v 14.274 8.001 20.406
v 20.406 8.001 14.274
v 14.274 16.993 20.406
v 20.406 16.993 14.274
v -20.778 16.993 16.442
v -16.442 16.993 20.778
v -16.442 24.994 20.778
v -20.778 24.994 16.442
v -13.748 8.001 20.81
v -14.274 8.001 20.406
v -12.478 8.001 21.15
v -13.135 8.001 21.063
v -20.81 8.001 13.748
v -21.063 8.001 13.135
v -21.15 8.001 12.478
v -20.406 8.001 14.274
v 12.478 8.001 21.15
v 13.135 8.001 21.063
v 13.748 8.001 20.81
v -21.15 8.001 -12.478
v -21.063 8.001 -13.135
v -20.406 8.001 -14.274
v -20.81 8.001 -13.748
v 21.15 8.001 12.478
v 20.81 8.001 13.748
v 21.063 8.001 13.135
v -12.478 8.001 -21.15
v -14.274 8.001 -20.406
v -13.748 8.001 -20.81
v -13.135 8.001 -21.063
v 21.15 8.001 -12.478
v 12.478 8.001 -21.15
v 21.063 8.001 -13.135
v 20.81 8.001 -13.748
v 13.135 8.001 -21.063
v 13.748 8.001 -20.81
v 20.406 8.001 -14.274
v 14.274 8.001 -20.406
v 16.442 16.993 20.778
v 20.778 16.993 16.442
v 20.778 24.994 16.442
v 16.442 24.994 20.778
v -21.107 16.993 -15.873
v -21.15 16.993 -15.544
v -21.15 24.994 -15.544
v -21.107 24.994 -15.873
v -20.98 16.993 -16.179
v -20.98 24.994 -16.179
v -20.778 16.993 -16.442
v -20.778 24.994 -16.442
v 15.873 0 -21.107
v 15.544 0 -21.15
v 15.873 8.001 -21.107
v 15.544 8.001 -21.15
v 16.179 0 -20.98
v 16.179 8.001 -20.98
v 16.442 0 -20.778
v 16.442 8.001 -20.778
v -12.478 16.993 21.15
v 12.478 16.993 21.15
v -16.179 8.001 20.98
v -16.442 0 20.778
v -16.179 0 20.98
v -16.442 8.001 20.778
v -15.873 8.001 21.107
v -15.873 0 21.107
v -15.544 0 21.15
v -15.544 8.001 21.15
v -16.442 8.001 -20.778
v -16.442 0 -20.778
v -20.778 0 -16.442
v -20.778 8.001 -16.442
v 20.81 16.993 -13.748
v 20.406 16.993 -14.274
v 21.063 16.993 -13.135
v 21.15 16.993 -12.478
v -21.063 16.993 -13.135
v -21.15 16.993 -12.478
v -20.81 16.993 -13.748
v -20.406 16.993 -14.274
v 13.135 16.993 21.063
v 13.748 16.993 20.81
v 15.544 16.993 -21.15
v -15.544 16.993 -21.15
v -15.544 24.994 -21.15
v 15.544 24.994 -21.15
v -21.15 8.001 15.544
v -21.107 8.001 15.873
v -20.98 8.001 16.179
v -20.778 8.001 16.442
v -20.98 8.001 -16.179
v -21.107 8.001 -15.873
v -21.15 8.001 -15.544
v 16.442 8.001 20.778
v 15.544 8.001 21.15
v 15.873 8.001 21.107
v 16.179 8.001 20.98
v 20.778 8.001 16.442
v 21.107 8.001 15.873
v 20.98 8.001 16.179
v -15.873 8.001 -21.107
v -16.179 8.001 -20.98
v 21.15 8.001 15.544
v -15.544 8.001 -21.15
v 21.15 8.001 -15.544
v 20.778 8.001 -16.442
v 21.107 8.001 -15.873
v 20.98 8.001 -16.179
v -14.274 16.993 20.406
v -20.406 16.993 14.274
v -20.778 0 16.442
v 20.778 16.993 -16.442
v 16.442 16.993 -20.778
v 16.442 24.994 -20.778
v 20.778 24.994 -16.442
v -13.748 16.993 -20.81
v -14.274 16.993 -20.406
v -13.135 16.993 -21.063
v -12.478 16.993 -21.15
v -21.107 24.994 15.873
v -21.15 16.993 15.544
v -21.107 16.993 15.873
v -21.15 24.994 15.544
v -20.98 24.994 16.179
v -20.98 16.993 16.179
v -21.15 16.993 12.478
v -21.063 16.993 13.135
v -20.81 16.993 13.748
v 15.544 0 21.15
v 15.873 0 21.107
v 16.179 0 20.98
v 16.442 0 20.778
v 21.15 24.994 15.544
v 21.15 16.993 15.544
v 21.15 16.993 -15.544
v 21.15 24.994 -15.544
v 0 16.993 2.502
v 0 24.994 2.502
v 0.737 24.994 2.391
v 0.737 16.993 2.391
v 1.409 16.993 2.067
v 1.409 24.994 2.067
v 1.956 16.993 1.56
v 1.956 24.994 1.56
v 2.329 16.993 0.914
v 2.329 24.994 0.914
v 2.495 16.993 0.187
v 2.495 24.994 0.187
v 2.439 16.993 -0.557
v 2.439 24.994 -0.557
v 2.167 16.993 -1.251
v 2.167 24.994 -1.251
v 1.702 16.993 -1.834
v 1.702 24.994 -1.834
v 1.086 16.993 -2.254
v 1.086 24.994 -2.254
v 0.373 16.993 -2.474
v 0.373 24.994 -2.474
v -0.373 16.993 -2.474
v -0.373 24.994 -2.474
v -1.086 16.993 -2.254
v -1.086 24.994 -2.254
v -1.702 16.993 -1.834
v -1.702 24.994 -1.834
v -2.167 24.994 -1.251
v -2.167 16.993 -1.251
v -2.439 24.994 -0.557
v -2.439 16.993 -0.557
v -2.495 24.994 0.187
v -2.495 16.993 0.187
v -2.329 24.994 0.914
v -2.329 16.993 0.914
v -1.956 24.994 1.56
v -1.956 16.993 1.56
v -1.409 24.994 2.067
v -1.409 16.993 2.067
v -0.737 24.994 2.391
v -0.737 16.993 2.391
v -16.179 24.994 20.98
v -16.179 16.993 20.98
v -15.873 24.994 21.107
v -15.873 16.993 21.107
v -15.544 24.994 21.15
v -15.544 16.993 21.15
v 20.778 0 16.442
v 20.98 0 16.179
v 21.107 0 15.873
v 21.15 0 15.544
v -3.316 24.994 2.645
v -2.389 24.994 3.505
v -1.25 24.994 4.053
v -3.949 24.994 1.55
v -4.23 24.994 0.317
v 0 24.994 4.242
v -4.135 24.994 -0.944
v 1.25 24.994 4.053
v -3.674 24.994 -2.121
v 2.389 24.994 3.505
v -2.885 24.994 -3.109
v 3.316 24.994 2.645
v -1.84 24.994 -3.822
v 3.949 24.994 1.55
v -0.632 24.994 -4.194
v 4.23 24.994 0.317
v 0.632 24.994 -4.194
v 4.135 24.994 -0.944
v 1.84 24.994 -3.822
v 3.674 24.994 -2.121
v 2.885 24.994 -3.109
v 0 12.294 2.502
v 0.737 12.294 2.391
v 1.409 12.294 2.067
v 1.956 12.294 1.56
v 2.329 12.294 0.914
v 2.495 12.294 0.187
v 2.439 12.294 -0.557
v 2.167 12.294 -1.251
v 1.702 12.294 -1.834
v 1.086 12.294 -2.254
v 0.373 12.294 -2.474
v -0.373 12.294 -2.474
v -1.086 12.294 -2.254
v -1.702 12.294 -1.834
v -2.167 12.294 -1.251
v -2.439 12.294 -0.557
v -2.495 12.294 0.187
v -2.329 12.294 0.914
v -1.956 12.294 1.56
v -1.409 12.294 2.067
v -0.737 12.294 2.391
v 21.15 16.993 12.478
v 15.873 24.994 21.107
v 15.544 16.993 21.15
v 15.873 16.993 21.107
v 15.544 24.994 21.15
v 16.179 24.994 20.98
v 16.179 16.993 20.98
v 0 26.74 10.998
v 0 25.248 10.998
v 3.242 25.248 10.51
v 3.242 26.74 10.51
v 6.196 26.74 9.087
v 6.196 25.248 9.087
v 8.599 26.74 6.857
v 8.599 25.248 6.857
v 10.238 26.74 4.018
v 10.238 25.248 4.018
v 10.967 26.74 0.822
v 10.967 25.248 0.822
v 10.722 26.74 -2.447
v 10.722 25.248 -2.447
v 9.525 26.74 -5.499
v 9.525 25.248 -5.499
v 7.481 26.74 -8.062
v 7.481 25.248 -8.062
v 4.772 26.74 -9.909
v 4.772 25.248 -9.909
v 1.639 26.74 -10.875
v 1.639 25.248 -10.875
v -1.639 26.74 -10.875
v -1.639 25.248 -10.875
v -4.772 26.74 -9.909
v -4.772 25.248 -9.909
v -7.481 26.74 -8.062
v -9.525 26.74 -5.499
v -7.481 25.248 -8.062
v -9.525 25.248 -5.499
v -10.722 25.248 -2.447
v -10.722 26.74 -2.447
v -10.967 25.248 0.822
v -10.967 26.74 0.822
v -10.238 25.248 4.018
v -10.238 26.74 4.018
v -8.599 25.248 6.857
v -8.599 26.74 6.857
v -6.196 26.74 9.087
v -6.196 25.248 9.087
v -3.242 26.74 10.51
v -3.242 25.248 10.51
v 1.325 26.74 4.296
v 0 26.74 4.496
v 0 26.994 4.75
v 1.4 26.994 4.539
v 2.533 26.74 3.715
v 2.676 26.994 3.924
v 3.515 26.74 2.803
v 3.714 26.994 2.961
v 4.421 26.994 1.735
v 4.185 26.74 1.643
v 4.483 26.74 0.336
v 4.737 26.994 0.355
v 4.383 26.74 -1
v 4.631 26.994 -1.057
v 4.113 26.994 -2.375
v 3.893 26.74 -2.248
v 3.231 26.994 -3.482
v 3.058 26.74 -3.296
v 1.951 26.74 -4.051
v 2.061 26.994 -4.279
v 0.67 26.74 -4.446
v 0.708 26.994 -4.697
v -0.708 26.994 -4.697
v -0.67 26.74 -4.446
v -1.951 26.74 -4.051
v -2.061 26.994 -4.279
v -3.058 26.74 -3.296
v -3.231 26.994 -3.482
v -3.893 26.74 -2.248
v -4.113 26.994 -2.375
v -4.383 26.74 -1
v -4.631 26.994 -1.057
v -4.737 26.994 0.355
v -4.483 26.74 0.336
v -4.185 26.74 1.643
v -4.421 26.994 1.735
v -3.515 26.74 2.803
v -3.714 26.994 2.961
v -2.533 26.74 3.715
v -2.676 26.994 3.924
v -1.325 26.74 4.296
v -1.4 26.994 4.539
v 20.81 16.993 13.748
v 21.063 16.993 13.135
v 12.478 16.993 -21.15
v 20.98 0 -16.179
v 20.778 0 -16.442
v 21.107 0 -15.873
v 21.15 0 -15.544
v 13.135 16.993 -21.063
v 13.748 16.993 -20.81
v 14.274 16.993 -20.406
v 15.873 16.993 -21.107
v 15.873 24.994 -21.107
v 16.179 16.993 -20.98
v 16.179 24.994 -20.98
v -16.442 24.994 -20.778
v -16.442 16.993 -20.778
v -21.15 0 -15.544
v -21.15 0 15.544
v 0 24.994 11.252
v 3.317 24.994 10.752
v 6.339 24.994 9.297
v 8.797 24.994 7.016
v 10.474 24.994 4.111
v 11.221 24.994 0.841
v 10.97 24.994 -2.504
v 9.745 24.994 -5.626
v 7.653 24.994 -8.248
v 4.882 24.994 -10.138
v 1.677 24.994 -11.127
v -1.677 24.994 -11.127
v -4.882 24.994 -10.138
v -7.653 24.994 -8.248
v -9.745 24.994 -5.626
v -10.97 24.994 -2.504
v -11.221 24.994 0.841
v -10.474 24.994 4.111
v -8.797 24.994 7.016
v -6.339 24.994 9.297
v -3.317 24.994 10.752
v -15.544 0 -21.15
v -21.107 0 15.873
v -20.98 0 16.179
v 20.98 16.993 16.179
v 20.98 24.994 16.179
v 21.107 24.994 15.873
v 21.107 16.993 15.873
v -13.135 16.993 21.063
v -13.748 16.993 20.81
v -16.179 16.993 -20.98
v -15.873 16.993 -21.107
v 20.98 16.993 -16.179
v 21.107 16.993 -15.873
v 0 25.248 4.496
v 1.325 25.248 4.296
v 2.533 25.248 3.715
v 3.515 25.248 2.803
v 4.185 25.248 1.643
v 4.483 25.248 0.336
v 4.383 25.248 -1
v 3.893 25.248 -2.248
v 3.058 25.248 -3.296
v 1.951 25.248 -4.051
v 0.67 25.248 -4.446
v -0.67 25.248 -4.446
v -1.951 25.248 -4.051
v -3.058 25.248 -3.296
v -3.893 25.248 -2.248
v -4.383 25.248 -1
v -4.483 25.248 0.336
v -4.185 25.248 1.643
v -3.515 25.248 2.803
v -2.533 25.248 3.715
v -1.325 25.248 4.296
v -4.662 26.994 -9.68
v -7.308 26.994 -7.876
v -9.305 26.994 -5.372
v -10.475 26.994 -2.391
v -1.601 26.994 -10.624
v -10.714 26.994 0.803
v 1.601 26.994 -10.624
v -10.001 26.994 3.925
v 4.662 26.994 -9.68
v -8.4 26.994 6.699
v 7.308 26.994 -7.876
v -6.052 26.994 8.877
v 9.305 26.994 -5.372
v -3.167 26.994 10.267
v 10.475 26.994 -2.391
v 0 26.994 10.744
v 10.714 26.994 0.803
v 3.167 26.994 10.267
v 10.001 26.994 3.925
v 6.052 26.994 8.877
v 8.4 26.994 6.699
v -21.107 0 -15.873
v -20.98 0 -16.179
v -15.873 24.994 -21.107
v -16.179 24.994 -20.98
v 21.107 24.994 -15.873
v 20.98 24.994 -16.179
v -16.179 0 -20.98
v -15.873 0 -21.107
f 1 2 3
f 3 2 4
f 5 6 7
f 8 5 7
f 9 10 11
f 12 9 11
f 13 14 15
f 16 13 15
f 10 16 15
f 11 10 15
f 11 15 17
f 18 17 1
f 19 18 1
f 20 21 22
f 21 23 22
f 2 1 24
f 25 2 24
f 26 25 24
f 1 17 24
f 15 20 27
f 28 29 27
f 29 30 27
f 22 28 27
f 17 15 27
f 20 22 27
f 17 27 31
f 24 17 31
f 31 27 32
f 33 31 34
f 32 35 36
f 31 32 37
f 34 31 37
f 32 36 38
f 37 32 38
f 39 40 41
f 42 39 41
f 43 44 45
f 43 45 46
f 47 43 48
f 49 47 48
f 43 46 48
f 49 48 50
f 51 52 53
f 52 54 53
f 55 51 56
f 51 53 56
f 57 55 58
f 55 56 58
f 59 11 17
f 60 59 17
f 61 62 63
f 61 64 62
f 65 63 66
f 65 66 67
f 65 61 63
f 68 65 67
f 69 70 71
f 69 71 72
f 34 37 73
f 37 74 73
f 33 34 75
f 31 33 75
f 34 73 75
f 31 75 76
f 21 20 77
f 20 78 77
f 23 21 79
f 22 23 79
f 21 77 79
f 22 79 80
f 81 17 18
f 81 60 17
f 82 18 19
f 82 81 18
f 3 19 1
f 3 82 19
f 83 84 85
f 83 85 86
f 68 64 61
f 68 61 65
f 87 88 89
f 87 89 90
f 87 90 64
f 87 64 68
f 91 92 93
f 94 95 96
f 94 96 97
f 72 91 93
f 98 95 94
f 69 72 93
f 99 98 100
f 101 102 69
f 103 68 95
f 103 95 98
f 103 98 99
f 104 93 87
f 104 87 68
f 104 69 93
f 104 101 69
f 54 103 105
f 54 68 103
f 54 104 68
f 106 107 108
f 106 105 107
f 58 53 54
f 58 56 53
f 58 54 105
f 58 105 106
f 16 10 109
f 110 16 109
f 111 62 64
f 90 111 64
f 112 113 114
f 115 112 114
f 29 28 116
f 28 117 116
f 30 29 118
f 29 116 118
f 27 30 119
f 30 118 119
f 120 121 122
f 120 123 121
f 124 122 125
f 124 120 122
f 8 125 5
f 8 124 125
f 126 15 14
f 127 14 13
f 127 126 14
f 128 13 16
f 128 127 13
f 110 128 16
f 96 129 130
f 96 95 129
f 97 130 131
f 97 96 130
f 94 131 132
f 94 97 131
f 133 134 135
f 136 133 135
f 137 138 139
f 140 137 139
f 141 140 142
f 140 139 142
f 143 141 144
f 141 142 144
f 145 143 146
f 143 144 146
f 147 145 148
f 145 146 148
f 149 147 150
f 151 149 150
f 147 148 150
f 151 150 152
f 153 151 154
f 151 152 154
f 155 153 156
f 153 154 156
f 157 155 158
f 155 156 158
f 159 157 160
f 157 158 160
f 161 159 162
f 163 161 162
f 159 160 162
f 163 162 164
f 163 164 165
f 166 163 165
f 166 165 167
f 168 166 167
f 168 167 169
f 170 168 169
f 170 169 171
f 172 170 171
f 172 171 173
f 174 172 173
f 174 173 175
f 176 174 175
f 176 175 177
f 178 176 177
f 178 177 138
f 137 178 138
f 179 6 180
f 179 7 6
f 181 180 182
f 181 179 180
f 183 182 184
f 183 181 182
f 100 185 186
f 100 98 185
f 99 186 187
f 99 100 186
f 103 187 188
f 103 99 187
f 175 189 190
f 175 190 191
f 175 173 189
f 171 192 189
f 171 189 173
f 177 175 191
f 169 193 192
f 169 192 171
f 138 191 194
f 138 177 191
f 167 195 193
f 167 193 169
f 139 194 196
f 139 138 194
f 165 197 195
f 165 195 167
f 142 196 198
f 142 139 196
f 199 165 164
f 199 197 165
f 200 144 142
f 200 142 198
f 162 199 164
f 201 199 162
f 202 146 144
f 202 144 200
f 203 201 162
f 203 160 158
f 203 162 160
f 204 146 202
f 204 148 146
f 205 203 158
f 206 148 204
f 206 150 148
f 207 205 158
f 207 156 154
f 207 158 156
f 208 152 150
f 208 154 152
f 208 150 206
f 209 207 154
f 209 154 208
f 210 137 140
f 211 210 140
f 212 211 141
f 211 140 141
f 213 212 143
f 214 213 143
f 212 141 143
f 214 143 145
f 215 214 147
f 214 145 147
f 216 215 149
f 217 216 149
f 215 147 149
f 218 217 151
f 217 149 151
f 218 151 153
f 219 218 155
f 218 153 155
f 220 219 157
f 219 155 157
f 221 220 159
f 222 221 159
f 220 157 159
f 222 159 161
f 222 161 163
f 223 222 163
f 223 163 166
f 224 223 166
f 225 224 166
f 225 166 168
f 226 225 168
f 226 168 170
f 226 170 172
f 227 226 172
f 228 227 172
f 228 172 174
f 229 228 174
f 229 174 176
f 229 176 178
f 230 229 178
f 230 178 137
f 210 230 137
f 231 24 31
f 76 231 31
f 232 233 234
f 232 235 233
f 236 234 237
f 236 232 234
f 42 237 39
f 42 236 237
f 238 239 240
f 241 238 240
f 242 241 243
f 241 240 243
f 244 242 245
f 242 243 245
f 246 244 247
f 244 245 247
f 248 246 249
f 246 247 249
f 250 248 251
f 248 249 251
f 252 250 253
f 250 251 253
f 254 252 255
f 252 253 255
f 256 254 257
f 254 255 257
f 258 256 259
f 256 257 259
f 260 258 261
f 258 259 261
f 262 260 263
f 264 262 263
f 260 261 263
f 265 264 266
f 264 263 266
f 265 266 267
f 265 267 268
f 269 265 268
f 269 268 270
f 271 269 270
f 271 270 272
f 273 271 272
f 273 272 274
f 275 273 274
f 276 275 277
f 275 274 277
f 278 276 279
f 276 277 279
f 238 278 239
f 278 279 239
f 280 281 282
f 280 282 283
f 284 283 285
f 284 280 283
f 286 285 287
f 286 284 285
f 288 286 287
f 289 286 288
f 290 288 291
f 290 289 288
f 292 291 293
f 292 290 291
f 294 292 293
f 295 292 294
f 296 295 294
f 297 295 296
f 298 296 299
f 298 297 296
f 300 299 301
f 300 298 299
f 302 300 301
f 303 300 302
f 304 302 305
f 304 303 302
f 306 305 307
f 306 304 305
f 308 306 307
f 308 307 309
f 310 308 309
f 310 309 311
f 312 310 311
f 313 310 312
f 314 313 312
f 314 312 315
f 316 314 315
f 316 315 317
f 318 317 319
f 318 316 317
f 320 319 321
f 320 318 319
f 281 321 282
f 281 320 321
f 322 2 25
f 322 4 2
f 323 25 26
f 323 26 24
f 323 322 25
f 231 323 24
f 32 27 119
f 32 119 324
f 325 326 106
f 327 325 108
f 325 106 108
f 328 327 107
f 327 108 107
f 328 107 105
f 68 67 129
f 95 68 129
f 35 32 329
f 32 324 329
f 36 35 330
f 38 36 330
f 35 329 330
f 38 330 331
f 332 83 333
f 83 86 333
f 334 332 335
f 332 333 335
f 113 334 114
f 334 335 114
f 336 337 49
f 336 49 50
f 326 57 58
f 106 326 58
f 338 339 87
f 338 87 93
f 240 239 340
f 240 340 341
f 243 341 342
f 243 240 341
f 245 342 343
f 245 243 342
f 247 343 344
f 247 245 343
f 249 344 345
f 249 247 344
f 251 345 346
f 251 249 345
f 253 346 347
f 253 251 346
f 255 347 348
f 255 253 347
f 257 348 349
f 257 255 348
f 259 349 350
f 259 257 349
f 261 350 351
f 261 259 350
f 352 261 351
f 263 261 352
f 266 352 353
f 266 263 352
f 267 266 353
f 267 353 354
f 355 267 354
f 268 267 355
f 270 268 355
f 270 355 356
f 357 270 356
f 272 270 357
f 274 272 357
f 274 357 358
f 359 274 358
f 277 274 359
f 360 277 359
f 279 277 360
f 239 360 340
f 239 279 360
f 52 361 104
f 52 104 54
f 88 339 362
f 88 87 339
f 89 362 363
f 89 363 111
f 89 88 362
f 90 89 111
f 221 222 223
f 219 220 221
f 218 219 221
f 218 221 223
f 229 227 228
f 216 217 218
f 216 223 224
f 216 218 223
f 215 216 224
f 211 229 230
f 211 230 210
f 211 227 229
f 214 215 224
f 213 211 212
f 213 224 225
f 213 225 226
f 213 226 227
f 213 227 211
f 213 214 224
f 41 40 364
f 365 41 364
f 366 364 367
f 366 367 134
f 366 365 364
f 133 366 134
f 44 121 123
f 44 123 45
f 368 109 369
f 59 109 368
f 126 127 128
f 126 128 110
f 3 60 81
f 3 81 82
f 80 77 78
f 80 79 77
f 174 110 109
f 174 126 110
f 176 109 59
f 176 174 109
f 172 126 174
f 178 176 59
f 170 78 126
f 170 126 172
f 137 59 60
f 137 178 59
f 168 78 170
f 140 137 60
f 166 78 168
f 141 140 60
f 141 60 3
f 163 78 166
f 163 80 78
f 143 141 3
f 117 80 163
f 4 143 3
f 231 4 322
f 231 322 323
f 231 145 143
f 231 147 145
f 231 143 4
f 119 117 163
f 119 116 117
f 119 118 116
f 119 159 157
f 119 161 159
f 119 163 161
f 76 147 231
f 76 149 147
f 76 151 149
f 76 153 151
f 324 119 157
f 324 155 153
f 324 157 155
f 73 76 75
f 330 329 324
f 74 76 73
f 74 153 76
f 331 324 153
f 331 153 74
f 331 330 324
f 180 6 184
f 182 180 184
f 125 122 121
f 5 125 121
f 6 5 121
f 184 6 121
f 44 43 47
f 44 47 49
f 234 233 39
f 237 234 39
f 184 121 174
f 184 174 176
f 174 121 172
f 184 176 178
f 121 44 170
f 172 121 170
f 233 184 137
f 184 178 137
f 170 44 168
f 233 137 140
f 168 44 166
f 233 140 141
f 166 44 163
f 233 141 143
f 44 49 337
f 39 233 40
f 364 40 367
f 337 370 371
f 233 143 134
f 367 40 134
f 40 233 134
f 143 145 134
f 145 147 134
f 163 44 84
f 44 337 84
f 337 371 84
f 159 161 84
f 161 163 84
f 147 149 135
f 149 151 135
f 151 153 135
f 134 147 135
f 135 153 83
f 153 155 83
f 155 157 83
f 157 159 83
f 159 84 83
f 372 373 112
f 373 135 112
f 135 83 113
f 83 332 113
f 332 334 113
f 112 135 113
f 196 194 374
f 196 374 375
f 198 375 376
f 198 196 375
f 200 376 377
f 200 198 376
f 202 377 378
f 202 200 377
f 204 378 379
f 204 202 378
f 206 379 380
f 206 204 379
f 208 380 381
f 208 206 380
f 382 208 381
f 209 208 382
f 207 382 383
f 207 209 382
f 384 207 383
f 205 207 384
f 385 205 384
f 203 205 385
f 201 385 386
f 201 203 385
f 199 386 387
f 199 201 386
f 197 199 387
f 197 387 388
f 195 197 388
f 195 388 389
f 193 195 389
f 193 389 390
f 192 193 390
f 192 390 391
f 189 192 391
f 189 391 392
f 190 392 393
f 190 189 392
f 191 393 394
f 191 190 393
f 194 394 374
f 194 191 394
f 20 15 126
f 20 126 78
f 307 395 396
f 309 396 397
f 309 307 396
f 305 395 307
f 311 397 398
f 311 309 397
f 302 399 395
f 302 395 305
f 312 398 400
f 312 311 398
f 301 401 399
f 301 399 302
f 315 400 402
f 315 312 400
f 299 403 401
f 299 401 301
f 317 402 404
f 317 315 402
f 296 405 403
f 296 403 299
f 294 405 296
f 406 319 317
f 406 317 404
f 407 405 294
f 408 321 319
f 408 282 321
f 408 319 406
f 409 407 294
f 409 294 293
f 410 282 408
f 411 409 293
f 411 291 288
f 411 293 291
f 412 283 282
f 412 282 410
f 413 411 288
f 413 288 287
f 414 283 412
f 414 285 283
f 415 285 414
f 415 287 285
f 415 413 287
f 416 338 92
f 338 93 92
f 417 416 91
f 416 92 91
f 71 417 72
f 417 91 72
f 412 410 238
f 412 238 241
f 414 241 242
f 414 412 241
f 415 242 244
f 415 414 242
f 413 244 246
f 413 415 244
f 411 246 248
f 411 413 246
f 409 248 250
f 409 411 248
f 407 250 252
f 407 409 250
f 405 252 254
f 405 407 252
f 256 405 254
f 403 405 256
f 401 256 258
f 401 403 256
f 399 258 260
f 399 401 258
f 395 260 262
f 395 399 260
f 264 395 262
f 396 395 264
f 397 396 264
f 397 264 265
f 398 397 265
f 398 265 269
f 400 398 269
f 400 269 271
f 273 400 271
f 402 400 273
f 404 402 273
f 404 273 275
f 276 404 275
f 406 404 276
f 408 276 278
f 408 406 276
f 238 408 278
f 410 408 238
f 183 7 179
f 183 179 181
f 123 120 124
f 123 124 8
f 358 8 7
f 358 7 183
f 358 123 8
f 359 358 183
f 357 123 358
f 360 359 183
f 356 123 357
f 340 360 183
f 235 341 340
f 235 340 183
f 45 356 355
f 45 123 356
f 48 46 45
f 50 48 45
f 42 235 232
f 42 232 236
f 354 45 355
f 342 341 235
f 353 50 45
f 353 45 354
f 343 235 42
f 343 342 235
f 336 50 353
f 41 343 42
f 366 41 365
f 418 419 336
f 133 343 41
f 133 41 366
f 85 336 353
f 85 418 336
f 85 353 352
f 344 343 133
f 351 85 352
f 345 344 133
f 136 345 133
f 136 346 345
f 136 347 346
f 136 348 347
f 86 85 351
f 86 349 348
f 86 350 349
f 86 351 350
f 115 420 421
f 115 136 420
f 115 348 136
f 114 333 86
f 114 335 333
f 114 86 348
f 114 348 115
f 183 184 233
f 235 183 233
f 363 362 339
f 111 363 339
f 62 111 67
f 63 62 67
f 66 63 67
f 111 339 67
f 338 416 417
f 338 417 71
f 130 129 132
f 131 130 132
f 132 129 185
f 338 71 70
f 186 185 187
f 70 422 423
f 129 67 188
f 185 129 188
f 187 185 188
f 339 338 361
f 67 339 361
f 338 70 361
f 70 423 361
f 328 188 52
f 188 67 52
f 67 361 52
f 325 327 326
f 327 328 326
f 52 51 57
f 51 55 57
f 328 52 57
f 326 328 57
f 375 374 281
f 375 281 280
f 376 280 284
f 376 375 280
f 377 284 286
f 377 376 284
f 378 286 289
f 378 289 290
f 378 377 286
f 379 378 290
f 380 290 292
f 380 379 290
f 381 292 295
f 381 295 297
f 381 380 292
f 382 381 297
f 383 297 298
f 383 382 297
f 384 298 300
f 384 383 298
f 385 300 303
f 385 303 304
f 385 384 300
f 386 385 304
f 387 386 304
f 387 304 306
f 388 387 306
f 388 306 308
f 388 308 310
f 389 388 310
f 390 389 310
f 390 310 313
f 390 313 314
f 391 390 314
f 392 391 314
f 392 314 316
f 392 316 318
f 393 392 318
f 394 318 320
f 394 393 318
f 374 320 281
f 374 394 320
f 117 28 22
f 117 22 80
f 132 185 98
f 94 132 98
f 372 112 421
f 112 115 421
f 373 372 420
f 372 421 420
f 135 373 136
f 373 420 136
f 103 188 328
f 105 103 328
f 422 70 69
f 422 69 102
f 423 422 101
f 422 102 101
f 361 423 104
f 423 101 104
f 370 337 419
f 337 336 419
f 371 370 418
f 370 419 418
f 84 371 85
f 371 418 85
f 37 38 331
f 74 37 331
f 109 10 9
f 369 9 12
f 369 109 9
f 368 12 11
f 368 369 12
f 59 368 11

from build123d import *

# Parameters (mm, degrees)
SKETCH1_W           = 42.3
SKETCH1_H           = 42.3
BOSS_EXTRUDE1_DEPTH = 8.001
CHAMFER1_SIZE       = 5.08
SKETCH2_W           = 42.3
SKETCH2_H           = 42.3
BOSS_EXTRUDE2_DEPTH = 8.9916
CHAMFER3_SIZE       = 7.62
FILLET1_R           = 2.54
FILLET2_R           = 1.27
SKETCH3_W           = 42.3
SKETCH3_H           = 42.3
BOSS_EXTRUDE3_DEPTH = 8.001
CHAMFER4_SIZE       = 5.08
FILLET3_R           = 1.27
SKETCH4_R           = 10.9982
SKETCH4_R_2         = 4.4958
BOSS_EXTRUDE4_DEPTH = 2
CHAMFER5_SIZE       = 0.254
SKETCH5_R           = 2.5019
CUT_EXTRUDE1_DEPTH  = 12.7


with BuildPart() as part:
    # Sketch1 → Boss-Extrude1 (new body)
    with BuildSketch(Plane(origin=(0, 0, 0), x_dir=(1, 0, 0), z_dir=(0, 1, 0))):
        Rectangle(SKETCH1_W, SKETCH1_H)
    extrude(amount=BOSS_EXTRUDE1_DEPTH)

    # Chamfer1
    chamfer1_edges = [part.edges().sort_by_distance(p)[0] for p in [
        (21.15, 4.0005, 21.15),
        (-21.15, 4.0005, 21.15),
        (-21.15, 4.0005, -21.15),
        (21.15, 4.0005, -21.15),
    ]]
    chamfer(chamfer1_edges, length=CHAMFER1_SIZE)

    # Fillet2
    fillet2_edges = [part.edges().sort_by_distance(p)[0] for p in [
        (16.07, 4.0005, 21.15),
        (-16.07, 4.0005, 21.15),
        (-21.15, 4.0005, -16.07),
        (-21.15, 4.0005, 16.07),
        (16.07, 4.0005, -21.15),
        (-16.07, 4.0005, -21.15),
        (21.15, 4.0005, 16.07),
        (21.15, 4.0005, -16.07),
    ]]
    fillet(fillet2_edges, radius=FILLET2_R)


with BuildPart() as body_2:
    # Sketch2 → Boss-Extrude2 (new body)
    with BuildSketch(Plane(origin=(0, 8.001, 0), x_dir=(1, 0, 0), z_dir=(0, 1, 0))):
        Rectangle(SKETCH2_W, SKETCH2_H)
    extrude(amount=BOSS_EXTRUDE2_DEPTH)

    # Chamfer3
    chamfer3_edges = [body_2.edges().sort_by_distance(p)[0] for p in [
        (21.15, 12.4968, 21.15),
        (-21.15, 12.4968, 21.15),
        (-21.15, 12.4968, -21.15),
        (21.15, 12.4968, -21.15),
    ]]
    chamfer(chamfer3_edges, length=CHAMFER3_SIZE)

    # Fillet1
    fillet1_edges = [body_2.edges().sort_by_distance(p)[0] for p in [
        (-21.15, 12.4968, 13.53),
        (-21.15, 12.4968, -13.53),
        (13.53, 12.4968, -21.15),
        (-13.53, 12.4968, -21.15),
        (13.53, 12.4968, 21.15),
        (-13.53, 12.4968, 21.15),
        (21.15, 12.4968, -13.53),
        (21.15, 12.4968, 13.53),
    ]]
    fillet(fillet1_edges, radius=FILLET1_R)


with BuildPart() as body_3:
    # Sketch3 → Boss-Extrude3 (new body)
    with BuildSketch(Plane(origin=(0, 16.9926, 0), x_dir=(1, 0, 0), z_dir=(0, 1, 0))):
        Rectangle(SKETCH3_W, SKETCH3_H)
    extrude(amount=BOSS_EXTRUDE3_DEPTH)

    # Chamfer4
    chamfer4_edges = [body_3.edges().sort_by_distance(p)[0] for p in [
        (21.15, 20.9931, 21.15),
        (-21.15, 20.9931, 21.15),
        (-21.15, 20.9931, -21.15),
        (21.15, 20.9931, -21.15),
    ]]
    chamfer(chamfer4_edges, length=CHAMFER4_SIZE)

    # Fillet3
    fillet3_edges = [body_3.edges().sort_by_distance(p)[0] for p in [
        (16.07, 20.9931, 21.15),
        (-16.07, 20.9931, 21.15),
        (-21.15, 20.9931, -16.07),
        (-21.15, 20.9931, 16.07),
        (16.07, 20.9931, -21.15),
        (-16.07, 20.9931, -21.15),
        (21.15, 20.9931, 16.07),
        (21.15, 20.9931, -16.07),
    ]]
    fillet(fillet3_edges, radius=FILLET3_R)

    # Sketch4 → Boss-Extrude4 (add)
    with BuildSketch(Plane(origin=(0, 24.9936, 0), x_dir=(1, 0, 0), z_dir=(0, 1, 0))):
        with Locations(Location((0, 0, 0), (0, 0, 270))):
            Circle(SKETCH4_R)
        with Locations(Location((0, 0, 0), (0, 0, 270))):
            Circle(SKETCH4_R_2, mode=Mode.SUBTRACT)
    extrude(amount=BOSS_EXTRUDE4_DEPTH)

    # Chamfer5
    chamfer5_edges = [body_3.edges().sort_by_distance(p)[0] for p in [
        (0, 26.9936, -10.9982),
        (0, 24.9936, -10.9982),
        (0, 26.9936, -4.4958),
        (0, 24.9936, -4.4958),
    ]]
    chamfer(chamfer5_edges, length=CHAMFER5_SIZE)


with BuildPart() as cut_extrude1_tool:
    # Sketch5 → Cut-Extrude1 (new body)
    with BuildSketch(Plane(origin=(0, 24.9936, 0), x_dir=(1, 0, 0), z_dir=(0, 1, 0))):
        with Locations(Location((0, 0, 0), (0, 0, 270))):
            Circle(SKETCH5_R)
    extrude(amount=-CUT_EXTRUDE1_DEPTH)


with BuildPart() as body_2_1:
    add(body_2.part)

    # Cut-Extrude1: cut by cut_extrude1_tool
    add(cut_extrude1_tool.part, mode=Mode.SUBTRACT)


with BuildPart() as body_3_1:
    add(body_3.part)

    # Cut-Extrude1: cut by cut_extrude1_tool
    add(cut_extrude1_tool.part, mode=Mode.SUBTRACT)


solid = Compound([part.part, body_2_1.part, body_3_1.part])
